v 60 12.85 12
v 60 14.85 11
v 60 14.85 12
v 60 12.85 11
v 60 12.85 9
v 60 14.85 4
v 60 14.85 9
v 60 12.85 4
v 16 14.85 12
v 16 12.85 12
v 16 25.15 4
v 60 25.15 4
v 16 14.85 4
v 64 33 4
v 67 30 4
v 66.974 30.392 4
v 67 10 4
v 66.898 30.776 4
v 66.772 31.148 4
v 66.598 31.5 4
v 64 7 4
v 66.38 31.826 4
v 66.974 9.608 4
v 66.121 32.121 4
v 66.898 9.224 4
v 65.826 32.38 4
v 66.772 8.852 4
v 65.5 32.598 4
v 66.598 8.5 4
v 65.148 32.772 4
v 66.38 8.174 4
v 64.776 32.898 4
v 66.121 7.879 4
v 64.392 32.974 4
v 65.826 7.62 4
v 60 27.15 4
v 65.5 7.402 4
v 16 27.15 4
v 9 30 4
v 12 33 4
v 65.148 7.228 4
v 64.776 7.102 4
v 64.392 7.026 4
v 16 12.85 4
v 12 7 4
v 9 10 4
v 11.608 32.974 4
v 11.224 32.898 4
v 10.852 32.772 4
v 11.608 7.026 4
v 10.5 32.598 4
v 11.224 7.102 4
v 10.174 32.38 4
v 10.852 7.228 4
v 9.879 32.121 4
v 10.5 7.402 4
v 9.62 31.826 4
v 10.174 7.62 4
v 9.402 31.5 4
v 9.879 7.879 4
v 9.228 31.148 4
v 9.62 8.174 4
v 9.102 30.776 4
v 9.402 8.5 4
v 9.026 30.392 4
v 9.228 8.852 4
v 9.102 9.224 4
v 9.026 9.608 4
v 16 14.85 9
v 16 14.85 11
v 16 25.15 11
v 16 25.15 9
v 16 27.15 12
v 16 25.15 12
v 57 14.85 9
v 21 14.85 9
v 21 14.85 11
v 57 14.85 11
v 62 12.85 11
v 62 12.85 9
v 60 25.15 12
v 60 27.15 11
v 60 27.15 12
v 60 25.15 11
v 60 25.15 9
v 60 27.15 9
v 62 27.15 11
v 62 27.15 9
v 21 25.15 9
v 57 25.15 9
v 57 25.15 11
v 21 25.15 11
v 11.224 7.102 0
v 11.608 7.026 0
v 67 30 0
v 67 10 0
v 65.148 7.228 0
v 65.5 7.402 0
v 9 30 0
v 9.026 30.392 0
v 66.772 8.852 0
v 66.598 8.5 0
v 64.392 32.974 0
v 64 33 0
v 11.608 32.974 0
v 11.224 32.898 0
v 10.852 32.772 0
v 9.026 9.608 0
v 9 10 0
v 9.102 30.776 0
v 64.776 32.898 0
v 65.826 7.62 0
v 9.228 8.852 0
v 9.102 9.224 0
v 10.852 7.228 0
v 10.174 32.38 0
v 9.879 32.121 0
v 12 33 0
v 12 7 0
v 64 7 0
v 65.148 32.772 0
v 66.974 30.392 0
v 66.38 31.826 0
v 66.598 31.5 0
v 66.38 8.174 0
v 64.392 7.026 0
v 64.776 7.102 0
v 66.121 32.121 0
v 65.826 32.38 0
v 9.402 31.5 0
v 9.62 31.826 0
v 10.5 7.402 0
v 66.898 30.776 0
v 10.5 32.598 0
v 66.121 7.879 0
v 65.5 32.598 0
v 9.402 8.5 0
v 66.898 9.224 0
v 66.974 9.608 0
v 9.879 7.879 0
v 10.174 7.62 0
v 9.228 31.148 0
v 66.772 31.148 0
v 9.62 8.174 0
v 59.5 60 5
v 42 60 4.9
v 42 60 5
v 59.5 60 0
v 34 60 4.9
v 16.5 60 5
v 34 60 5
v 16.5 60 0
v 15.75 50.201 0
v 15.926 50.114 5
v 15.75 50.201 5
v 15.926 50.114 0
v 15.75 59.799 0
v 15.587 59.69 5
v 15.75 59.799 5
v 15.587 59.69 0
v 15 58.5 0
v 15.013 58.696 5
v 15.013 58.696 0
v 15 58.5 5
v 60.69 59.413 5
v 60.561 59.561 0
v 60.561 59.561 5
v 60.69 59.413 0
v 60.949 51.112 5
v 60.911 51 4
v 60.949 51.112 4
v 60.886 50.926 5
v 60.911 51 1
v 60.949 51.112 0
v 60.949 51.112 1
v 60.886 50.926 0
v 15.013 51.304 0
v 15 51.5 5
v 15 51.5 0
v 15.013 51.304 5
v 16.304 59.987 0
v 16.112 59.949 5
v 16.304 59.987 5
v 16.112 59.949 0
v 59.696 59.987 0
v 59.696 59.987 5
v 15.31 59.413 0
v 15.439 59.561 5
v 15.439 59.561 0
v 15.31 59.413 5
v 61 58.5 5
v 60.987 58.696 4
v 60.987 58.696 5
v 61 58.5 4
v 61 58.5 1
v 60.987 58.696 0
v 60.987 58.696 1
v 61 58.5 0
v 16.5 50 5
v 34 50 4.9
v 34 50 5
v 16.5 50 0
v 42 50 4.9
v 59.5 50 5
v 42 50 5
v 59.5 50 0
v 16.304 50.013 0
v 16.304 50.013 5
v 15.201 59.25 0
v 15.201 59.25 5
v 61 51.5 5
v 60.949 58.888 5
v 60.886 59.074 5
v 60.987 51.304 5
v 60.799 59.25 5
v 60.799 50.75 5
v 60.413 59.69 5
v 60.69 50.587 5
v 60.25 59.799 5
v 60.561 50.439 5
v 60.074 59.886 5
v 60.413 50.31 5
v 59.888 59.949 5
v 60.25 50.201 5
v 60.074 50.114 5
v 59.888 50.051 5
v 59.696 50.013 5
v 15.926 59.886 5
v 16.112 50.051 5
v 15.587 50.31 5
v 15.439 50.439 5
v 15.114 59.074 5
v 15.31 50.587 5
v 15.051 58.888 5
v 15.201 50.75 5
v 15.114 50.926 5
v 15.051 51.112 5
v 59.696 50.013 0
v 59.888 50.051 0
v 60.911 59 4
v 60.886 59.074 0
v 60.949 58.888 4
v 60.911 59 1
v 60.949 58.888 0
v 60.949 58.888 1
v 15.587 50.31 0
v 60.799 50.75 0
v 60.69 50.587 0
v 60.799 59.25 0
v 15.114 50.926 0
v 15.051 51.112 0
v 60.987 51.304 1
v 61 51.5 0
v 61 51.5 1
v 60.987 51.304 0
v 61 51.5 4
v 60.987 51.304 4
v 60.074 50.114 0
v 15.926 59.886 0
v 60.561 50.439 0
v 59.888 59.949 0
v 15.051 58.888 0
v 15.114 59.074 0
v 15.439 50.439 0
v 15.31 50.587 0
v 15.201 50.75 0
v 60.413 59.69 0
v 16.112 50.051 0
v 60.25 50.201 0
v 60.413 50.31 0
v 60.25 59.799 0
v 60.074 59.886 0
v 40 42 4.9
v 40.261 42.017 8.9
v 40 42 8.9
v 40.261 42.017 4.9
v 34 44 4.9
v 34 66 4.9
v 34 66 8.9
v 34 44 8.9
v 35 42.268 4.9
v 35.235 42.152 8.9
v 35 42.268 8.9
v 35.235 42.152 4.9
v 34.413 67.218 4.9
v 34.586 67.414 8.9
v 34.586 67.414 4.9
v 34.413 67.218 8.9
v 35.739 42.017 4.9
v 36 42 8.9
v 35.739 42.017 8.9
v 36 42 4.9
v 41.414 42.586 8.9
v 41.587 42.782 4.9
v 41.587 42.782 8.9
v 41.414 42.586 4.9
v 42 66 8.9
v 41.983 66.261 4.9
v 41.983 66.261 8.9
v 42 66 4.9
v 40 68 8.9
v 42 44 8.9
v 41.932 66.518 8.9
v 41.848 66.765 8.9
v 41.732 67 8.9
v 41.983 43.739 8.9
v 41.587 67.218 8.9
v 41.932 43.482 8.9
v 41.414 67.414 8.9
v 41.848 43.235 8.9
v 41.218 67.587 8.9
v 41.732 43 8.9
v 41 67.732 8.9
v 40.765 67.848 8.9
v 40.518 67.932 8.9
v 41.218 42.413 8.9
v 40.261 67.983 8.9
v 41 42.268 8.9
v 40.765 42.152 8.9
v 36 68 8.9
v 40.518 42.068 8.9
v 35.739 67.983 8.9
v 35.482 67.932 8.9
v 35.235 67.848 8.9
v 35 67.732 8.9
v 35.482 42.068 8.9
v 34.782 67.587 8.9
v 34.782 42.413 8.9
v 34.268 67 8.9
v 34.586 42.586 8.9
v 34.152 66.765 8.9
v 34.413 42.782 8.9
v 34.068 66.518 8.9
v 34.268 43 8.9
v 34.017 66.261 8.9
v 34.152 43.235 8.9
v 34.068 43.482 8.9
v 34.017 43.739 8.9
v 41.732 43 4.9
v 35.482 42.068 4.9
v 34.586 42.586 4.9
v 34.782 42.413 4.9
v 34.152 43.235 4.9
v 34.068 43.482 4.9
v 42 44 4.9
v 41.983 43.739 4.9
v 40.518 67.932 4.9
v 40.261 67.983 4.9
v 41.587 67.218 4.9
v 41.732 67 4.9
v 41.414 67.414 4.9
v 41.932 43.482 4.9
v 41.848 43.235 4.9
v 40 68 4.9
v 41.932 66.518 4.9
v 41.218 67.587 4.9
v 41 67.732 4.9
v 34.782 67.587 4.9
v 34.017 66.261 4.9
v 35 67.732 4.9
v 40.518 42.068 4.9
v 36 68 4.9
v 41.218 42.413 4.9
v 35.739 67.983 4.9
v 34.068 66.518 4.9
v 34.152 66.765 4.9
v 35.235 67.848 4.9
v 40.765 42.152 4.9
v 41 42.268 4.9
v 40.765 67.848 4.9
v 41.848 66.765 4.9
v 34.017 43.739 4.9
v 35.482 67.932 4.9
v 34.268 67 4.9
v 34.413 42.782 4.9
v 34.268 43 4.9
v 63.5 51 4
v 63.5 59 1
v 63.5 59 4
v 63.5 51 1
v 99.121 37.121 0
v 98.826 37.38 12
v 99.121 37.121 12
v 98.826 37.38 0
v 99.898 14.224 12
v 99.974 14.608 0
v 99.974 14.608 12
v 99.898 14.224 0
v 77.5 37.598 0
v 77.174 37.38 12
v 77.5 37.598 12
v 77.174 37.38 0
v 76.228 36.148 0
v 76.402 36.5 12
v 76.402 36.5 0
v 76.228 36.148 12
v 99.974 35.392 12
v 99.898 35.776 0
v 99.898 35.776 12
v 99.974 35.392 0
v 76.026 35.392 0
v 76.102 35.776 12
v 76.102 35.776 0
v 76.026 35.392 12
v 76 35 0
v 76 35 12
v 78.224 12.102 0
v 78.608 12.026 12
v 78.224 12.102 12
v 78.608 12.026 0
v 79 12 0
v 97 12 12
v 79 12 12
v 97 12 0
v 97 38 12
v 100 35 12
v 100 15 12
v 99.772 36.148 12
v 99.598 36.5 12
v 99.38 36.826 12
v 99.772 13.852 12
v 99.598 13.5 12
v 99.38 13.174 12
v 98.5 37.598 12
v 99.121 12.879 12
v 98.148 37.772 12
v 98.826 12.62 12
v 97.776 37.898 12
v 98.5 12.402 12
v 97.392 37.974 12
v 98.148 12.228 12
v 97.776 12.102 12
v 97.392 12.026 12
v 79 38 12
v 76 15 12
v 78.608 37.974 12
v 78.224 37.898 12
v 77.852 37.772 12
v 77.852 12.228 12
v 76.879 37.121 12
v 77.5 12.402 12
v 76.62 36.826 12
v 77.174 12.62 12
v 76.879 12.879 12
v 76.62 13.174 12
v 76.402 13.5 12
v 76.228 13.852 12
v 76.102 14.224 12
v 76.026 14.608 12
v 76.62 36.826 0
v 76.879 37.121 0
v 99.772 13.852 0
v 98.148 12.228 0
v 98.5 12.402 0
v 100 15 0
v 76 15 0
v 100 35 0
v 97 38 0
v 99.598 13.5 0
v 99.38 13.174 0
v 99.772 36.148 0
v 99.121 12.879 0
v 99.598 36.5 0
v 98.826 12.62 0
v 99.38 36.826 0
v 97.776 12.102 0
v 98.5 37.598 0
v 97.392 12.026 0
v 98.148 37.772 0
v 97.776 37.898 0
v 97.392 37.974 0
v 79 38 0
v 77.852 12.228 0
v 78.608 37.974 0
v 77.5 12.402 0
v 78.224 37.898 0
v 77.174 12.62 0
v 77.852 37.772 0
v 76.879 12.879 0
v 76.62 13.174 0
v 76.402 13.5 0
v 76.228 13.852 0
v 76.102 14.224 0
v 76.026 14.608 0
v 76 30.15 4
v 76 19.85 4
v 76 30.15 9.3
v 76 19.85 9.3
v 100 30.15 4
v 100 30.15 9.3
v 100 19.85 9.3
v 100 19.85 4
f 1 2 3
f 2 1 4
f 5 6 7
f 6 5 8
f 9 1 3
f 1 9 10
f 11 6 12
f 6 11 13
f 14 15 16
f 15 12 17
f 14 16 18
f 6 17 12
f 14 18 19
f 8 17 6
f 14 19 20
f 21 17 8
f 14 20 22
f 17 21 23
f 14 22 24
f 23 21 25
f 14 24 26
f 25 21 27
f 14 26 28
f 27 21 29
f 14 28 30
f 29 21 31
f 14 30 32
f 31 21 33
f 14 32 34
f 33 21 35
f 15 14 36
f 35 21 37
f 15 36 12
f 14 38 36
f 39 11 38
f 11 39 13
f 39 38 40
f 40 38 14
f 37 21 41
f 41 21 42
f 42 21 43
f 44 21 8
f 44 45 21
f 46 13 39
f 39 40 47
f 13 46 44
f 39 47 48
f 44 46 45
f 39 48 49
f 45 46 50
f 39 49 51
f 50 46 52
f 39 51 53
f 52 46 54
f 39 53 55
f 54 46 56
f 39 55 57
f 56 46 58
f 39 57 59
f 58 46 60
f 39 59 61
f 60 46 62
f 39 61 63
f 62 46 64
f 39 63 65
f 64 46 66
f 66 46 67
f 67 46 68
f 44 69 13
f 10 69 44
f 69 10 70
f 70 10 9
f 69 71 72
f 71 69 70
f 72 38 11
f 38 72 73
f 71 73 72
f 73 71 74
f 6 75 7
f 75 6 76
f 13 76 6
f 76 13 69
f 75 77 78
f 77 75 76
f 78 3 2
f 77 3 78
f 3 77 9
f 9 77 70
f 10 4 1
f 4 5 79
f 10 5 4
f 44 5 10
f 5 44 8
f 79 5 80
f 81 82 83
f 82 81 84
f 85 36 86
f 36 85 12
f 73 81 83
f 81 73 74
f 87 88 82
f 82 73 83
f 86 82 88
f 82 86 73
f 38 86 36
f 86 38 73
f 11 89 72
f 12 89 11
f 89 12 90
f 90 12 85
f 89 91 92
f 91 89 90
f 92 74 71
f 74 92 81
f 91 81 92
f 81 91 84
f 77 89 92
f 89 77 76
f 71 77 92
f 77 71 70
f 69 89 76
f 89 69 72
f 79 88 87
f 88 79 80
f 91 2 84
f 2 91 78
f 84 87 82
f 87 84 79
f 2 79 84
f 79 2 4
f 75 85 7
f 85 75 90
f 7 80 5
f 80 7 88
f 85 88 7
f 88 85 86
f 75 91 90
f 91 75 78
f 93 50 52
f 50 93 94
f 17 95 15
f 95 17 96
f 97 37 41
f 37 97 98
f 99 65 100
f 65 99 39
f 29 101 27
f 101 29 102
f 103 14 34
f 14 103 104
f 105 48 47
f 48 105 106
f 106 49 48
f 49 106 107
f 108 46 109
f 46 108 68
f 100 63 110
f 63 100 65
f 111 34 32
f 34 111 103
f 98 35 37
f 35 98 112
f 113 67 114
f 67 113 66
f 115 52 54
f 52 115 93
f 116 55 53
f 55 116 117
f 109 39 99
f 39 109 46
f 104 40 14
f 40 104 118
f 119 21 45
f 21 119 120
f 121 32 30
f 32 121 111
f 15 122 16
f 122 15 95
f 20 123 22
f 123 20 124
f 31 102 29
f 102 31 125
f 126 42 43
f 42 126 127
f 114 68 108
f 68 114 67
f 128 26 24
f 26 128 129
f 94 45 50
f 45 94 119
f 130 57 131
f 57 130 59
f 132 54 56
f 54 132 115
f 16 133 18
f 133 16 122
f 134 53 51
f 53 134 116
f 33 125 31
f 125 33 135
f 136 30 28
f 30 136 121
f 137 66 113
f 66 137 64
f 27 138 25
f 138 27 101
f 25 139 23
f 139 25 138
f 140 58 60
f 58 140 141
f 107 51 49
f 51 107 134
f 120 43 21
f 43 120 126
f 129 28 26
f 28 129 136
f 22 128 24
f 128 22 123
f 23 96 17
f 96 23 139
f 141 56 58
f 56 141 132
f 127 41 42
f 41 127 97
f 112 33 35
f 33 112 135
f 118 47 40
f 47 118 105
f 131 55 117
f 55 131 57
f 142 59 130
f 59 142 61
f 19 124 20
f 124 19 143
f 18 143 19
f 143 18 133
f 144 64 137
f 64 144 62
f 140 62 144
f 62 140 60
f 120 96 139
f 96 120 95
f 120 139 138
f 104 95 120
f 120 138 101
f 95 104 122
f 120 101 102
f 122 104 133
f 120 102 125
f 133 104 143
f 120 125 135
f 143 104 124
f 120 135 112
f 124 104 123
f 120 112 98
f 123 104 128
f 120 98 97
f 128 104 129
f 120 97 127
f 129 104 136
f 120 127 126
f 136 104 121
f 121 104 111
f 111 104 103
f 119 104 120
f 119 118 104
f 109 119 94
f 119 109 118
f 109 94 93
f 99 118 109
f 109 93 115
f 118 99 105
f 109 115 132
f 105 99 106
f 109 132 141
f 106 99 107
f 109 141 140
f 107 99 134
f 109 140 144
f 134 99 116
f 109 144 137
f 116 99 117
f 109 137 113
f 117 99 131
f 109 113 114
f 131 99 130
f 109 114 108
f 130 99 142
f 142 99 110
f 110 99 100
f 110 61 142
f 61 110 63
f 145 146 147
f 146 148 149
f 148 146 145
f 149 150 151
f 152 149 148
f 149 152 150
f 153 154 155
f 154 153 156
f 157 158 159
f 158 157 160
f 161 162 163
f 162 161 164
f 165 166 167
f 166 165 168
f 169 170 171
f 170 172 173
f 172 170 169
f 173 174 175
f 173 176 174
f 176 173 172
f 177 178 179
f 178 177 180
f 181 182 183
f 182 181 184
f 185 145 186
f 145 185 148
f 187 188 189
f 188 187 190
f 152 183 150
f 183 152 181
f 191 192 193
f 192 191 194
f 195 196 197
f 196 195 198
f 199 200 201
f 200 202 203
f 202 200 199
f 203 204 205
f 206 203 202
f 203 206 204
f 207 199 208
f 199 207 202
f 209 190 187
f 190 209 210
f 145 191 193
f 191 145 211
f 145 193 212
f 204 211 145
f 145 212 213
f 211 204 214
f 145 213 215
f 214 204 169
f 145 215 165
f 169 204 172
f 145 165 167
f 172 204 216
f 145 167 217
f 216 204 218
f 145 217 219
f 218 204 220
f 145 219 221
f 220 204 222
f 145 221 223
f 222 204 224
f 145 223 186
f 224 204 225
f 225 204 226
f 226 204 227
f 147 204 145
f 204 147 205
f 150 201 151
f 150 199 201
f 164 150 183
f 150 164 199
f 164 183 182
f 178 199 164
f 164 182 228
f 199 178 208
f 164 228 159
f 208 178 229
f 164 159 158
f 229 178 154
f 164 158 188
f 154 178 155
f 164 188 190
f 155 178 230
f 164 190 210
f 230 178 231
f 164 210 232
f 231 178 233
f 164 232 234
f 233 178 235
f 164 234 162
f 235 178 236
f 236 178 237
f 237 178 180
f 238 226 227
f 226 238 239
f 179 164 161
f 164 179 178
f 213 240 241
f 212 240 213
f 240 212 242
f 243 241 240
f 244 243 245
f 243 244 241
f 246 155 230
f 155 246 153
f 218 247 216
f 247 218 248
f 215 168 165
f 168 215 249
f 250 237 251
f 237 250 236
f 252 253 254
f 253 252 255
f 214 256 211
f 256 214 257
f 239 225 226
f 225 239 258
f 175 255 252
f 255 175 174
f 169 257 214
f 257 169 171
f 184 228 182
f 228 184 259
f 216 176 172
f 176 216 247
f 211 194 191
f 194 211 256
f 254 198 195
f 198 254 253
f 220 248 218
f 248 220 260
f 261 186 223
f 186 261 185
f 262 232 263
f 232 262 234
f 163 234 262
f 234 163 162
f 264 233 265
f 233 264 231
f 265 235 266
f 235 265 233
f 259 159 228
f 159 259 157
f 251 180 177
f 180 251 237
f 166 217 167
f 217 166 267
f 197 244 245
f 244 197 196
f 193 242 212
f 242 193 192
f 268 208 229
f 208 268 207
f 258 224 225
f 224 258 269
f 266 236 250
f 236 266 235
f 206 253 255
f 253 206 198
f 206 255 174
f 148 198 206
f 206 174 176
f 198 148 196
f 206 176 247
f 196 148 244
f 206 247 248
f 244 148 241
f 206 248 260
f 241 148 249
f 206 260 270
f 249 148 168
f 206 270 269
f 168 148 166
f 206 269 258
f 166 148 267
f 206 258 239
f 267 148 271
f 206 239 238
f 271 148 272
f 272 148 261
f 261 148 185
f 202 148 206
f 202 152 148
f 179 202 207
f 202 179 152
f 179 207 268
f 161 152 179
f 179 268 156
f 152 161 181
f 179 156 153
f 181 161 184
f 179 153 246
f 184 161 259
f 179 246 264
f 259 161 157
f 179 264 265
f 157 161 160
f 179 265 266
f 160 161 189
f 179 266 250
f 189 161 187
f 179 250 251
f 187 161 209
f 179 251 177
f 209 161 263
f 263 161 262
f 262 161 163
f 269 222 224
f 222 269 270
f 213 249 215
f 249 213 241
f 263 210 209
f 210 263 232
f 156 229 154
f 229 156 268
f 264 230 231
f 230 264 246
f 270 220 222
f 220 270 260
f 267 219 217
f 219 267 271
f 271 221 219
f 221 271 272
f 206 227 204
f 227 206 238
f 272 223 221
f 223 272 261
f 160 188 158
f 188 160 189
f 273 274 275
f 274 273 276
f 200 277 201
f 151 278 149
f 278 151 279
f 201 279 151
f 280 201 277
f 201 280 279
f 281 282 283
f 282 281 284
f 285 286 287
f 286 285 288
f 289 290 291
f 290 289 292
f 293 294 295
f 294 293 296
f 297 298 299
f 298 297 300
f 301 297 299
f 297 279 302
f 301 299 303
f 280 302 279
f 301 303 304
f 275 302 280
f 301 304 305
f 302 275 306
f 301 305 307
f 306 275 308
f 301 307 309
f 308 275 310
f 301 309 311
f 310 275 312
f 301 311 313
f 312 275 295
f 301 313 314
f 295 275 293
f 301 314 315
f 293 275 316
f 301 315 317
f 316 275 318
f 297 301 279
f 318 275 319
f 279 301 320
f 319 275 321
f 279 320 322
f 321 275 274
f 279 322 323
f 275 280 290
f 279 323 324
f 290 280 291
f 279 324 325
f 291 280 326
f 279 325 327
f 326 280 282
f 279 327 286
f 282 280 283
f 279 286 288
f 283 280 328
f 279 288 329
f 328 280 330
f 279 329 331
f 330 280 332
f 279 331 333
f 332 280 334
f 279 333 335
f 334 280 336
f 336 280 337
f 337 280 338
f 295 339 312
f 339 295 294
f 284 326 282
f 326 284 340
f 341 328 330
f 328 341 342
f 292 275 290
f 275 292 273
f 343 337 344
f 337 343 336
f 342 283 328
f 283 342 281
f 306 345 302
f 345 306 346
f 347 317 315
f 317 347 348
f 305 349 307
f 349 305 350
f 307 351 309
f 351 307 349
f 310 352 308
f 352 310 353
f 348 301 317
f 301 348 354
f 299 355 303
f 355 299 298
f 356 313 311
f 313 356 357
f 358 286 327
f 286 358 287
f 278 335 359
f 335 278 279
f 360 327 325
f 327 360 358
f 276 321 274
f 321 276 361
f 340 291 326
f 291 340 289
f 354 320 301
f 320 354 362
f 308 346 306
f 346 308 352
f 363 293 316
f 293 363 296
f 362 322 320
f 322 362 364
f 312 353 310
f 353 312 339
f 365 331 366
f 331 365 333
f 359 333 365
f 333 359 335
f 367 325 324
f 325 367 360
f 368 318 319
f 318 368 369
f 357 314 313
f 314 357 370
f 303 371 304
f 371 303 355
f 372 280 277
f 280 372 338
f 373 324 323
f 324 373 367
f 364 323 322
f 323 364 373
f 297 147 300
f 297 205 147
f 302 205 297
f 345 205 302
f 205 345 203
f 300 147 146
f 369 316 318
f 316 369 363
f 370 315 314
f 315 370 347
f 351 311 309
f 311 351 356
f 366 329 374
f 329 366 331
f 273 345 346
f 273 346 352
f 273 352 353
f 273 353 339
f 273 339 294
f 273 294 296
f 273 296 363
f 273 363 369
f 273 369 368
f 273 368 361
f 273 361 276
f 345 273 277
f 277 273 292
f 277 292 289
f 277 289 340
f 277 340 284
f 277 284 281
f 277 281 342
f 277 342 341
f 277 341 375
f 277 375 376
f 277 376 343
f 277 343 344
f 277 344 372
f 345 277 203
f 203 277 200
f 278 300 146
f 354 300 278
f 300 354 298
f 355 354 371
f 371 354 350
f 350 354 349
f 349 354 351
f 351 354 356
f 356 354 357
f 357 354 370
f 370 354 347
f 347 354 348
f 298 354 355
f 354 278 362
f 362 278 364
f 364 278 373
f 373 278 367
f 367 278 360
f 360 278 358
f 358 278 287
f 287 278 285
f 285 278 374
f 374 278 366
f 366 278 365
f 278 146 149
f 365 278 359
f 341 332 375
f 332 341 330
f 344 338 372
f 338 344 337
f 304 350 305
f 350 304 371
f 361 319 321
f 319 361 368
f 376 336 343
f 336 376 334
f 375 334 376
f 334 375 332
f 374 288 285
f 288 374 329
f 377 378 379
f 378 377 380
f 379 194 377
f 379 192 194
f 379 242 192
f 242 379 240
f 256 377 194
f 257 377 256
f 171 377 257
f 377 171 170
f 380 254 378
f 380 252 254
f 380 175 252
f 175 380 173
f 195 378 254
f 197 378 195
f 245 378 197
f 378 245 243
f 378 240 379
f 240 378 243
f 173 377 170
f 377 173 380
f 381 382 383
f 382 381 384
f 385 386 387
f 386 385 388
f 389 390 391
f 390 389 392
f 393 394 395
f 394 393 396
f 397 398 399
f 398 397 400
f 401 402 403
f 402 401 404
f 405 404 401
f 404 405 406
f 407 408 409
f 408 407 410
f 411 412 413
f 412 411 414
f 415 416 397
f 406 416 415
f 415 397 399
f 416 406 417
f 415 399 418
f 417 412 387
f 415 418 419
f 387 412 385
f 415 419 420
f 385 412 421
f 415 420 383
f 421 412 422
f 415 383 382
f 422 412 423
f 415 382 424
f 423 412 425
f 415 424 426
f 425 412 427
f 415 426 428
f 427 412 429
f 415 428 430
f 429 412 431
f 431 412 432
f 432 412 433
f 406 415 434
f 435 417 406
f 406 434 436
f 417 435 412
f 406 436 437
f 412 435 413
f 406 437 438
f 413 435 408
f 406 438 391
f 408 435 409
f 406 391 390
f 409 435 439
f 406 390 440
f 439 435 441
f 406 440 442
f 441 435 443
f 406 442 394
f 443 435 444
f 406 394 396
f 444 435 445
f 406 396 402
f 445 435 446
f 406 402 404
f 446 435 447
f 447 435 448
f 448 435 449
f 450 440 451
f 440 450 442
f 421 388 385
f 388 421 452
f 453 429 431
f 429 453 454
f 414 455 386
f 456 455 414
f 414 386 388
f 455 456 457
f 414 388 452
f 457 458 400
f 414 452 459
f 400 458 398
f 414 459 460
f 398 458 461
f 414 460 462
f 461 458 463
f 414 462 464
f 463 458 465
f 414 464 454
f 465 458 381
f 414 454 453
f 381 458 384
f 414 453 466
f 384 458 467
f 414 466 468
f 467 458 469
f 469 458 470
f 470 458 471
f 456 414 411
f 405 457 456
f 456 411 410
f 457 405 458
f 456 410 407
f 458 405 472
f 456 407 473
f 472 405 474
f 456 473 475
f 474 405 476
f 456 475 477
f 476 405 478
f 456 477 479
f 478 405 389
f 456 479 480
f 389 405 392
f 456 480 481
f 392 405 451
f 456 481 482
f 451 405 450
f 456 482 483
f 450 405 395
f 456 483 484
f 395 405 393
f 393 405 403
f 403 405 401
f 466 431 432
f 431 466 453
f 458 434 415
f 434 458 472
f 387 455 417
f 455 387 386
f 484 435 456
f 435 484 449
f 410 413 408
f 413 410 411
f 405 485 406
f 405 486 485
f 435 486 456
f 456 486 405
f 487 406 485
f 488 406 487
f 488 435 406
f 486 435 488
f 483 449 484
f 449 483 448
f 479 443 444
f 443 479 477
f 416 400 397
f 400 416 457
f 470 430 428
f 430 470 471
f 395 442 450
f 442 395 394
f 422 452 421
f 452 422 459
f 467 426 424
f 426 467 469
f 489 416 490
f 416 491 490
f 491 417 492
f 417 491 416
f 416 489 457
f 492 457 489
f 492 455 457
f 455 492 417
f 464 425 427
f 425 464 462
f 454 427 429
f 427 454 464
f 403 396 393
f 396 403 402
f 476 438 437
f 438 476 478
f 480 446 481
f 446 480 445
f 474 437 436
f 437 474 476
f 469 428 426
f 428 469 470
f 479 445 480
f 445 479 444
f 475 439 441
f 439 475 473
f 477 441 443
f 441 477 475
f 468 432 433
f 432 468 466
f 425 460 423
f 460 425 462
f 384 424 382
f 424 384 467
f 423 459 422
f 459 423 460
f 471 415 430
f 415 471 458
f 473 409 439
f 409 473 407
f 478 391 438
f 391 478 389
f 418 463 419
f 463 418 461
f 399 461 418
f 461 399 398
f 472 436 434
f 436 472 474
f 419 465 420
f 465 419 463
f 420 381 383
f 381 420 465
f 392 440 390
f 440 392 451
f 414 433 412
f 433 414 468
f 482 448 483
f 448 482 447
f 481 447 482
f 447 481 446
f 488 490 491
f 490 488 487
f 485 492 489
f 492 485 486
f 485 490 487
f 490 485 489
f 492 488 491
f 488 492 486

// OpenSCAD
/*
Sample 081: Linearer Schubriegel — 0,15 mm
Generated from the FDM Mechanical Sample Library.
Units: millimetres.

Override examples:
  openscad -o custom.stl -D 'view="plate"' -D 'render_fn=64' model.scad
  openscad -o preview.png -D 'view="assembly"' model.scad
*/
use <../../../library/fdm_mechanisms.scad>

render_fn = is_undef(render_fn) ? 48 : render_fn;
view = is_undef(view) ? "plate" : view;
$fn = render_fn;

sample_slide_bolt(
    view=view,
    clearance=0.15,
    bolt_w=10,
    bolt_h=5
);
